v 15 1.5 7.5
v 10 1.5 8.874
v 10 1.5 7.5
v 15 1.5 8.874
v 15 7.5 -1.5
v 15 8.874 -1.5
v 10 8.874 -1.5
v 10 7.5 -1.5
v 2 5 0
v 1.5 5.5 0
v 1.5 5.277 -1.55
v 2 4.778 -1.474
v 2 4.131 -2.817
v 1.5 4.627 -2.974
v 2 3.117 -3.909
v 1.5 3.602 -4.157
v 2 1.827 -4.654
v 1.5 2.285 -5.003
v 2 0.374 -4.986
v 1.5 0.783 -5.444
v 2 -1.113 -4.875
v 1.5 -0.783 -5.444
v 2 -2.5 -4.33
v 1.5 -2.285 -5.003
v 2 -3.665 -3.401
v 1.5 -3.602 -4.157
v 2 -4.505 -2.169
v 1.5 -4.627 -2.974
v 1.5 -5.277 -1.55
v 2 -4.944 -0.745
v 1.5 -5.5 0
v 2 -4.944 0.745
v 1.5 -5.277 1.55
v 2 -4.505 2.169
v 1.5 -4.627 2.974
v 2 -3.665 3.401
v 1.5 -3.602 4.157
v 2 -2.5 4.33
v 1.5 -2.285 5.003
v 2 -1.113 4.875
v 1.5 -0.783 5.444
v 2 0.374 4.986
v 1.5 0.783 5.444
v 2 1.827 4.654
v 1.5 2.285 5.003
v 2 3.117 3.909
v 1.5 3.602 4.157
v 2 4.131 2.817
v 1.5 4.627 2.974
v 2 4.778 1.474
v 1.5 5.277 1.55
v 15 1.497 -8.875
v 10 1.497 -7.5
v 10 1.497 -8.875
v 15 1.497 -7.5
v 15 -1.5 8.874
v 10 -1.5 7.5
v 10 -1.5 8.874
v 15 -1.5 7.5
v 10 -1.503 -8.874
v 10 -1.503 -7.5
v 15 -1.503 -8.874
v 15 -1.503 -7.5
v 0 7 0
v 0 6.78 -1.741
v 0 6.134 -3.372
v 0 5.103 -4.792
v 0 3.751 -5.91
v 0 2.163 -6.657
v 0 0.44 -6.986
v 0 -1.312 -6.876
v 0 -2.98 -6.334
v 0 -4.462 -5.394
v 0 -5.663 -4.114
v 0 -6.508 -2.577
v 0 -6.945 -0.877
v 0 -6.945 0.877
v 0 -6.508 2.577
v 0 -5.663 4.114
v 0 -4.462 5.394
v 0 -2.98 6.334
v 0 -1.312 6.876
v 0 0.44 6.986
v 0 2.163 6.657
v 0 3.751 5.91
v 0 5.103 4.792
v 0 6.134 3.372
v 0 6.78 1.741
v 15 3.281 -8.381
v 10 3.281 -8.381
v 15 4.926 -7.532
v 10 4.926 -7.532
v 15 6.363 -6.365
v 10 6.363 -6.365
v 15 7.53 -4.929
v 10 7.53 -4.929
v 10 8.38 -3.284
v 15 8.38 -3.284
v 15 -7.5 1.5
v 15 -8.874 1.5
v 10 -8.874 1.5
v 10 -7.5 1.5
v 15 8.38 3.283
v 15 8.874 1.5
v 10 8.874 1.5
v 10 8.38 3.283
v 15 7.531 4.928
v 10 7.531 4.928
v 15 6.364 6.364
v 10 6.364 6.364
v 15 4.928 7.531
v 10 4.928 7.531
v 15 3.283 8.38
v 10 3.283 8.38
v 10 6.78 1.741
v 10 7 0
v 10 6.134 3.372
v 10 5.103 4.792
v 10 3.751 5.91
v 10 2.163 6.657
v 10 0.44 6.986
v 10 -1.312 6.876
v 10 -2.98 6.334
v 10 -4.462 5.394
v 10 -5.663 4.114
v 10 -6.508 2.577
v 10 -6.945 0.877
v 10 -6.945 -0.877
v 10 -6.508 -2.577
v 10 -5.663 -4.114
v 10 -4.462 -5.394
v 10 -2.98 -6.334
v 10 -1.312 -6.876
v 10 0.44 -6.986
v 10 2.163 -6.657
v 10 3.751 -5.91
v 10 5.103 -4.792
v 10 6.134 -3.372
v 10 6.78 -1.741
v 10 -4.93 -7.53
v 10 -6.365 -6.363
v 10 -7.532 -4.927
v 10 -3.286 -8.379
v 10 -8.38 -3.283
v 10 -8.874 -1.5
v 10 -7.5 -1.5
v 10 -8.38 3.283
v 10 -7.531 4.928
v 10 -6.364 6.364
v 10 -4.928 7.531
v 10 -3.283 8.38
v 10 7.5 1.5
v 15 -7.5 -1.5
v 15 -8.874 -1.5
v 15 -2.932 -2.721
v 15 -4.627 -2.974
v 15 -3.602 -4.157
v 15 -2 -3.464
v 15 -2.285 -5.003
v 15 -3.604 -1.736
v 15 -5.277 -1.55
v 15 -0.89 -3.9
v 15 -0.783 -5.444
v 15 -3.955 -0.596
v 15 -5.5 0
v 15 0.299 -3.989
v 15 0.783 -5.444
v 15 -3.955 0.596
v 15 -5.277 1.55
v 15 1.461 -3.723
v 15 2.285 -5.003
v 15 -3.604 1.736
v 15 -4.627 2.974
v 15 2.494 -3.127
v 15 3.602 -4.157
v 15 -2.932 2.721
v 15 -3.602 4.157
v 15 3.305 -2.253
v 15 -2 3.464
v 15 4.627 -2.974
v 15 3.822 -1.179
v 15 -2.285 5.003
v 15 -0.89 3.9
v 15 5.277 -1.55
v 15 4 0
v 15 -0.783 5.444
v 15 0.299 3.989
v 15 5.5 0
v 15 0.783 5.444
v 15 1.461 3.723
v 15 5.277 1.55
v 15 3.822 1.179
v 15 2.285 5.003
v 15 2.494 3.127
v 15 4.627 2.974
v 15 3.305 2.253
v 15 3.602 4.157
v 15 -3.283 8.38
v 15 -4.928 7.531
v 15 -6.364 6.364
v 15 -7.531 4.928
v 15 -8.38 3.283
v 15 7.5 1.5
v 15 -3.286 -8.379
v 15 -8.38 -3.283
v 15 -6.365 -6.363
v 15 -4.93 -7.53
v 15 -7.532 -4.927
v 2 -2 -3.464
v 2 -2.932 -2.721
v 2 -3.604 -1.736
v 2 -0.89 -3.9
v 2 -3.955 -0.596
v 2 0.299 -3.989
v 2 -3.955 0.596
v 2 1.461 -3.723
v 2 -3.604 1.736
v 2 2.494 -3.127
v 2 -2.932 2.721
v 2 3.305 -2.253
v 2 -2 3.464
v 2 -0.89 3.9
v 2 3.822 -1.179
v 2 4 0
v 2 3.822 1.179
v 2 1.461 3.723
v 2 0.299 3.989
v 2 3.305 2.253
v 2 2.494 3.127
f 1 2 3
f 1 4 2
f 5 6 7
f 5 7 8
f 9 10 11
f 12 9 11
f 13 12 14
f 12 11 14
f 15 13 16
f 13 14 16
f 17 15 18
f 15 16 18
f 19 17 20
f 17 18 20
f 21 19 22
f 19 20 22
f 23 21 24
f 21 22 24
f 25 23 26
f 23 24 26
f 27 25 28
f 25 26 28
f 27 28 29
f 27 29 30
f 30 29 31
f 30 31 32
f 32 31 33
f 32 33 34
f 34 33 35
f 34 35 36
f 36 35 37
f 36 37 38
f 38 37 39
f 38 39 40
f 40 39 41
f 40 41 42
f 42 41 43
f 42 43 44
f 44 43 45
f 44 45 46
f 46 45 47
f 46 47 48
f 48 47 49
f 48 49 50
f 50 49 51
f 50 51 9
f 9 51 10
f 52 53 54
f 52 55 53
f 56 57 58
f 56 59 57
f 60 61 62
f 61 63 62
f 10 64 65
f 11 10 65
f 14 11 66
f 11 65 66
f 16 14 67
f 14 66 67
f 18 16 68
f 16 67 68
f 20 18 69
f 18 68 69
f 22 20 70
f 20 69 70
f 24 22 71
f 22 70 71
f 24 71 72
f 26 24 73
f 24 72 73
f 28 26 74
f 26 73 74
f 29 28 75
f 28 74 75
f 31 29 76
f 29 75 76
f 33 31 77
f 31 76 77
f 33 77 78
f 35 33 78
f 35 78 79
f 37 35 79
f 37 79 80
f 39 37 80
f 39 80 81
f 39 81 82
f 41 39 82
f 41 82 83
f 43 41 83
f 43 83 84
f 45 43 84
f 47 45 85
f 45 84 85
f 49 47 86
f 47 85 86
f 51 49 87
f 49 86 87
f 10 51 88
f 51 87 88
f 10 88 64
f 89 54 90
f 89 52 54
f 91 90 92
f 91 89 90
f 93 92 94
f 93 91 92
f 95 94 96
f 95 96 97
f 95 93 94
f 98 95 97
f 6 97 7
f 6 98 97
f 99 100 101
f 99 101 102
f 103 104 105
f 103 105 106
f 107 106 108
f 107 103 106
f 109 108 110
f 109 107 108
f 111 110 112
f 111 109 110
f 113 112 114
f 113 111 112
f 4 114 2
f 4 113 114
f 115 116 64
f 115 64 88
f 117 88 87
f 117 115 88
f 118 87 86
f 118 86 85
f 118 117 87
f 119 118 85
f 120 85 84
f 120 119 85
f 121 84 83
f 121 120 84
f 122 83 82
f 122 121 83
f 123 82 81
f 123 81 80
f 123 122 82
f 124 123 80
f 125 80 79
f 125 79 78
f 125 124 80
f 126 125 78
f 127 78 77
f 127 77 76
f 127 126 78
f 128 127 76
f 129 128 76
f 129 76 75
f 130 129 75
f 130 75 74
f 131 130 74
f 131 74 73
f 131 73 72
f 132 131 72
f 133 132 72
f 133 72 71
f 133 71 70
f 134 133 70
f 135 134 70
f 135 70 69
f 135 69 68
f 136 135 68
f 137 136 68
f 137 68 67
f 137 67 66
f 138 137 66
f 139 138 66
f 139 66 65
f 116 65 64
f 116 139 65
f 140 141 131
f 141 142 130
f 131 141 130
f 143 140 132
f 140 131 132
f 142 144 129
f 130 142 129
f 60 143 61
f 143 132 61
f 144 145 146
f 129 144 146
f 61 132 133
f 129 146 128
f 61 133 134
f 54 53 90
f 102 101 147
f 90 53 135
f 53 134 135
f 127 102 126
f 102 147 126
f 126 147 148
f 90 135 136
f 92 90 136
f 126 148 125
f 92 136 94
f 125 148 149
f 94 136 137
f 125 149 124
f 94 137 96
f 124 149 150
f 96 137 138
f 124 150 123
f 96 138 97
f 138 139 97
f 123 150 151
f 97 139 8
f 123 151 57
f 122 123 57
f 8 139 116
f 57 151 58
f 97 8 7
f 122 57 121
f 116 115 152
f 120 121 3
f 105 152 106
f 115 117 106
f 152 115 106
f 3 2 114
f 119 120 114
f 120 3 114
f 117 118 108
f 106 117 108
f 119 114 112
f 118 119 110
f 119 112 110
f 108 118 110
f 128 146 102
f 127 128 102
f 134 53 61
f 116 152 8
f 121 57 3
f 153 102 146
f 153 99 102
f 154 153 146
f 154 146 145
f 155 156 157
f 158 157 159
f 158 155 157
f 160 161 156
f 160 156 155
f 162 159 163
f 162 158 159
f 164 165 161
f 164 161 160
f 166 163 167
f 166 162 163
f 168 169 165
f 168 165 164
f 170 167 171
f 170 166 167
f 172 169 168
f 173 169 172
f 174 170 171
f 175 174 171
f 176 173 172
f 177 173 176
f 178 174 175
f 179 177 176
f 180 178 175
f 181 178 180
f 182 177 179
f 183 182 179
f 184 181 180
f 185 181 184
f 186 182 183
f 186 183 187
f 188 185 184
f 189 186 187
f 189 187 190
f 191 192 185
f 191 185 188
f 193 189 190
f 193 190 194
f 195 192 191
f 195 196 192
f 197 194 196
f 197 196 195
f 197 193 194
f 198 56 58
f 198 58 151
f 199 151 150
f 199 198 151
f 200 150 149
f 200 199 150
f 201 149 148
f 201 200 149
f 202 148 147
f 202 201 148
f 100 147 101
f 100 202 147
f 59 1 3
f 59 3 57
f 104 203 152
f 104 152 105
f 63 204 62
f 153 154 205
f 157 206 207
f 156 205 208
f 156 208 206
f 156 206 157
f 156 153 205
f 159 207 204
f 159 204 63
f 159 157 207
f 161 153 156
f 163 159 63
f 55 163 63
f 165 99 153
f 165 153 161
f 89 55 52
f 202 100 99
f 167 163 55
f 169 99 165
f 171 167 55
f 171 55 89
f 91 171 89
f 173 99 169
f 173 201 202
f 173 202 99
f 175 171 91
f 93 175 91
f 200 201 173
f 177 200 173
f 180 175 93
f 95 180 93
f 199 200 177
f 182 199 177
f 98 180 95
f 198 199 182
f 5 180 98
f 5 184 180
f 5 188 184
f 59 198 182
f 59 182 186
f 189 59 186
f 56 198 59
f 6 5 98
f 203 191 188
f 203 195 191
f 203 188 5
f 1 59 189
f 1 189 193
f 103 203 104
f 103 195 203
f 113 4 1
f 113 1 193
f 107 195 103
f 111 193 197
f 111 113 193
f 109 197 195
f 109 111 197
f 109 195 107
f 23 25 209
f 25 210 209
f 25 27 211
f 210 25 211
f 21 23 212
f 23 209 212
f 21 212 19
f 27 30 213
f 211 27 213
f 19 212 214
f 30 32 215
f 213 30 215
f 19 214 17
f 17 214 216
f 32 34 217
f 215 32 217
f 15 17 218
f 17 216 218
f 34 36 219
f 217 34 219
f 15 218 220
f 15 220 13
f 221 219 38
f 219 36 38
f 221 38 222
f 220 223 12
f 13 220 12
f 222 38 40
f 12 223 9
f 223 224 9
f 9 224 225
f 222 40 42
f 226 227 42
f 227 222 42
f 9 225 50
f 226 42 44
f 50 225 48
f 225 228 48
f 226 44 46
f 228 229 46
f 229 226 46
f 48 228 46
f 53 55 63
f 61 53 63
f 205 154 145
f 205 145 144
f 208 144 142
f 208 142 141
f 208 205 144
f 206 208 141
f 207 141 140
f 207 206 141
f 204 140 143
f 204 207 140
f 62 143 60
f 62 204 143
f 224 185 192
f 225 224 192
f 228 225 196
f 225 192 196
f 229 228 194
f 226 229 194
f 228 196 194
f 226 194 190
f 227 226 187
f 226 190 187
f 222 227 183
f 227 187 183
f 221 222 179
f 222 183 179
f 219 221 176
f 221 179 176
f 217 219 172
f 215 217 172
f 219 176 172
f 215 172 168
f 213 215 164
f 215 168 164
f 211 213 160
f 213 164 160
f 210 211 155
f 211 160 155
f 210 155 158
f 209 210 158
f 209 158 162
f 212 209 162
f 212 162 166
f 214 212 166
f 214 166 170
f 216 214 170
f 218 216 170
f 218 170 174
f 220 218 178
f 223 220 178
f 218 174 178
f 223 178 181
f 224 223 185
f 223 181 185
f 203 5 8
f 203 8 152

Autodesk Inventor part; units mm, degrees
ref_plane "YZ Plane" through (0, 0, 0) normal (1, 0, 0) x (0, 1, 0)
ref_plane "XZ Plane" through (0, 0, 0) normal (0, 1, 0) x (-1, 0, 0)
ref_plane "XY Plane" through (0, 0, 0) normal (0, 0, 1) x (1, 0, 0)
sketch "Sketch1" plane through (0, 0, 0) normal (0, 0, 1) x (1, 0, 0)
  line L0 (0, 0) -> (0, 7) construction
  line L1 (0, 7) -> (10, 7)
  line L2 (0, 7) -> (1.5, 5.5)
  line L3 (10, 7) -> (10, 9)
  line L4 (10, 9) -> (15, 9)
  line L5 (15, 9) -> (15, 5.5)
  line L6 (15, 5.5) -> (1.5, 5.5)
  line L7 (0, 0) -> (19.3515, 0)
  line L8 (2, 4) -> (15, 4)
  line L9 (15, 4) -> (15, 5.5)
  line L10 (1.5, 5.5) -> (1.5, 0) construction
  line L11 (2, 5) -> (2, 4)
  line L12 (2, 5) -> (1.5, 5.5)
  dimension "d0" = 10
  dimension "d1" = 5
  dimension "d2" = 14
  dimension "d3" = 11
  dimension "d4" = 18
  dimension "d8" = 13
  dimension "d9" = 8
  dimension "d10" = 0.5
revolve "Revolution1" add sketch "Sketch1" angle 360 about axis through (0, 0, 0) along (1, 0, 0)
sketch "Sketch2" plane through (15, 0, 0) normal (1, 0, 0) x (0, 0, -1)
  line L0 (-1.5, 9.5651) -> (1.5, 9.5651)
  line L1 (1.5, 9.5651) -> (1.5, 7.5)
  line L2 (1.5, 7.5) -> (-1.5, 7.5)
  line L3 (-1.5, 7.5) -> (-1.5, 9.5651)
  line L4 (8.9736, 1.4966) -> (8.9736, -0.0034)
  line L5 (7.5, -0.0034) -> (7.5, 1.4966)
  line L6 (-1.5, -7.5) -> (1.5, -7.5)
  line L7 (1.5, -7.5) -> (1.5, -9.612)
  line L8 (1.5, -9.612) -> (-1.5, -9.612)
  line L9 (-1.5, -9.612) -> (-1.5, -7.5)
  circle A0 centre (0, 0) radius 7 projected
  circle A1 centre (0, 0) radius 9 projected
  circle A2 centre (0, 0) radius 4 projected
  line L10 (7.2867, -0.0034) -> (9.9612, -0.0034) construction
  line L11 (7.5, 1.4966) -> (9, 1.4966)
  line L12 (7.5, -1.5034) -> (9, -1.5034)
  line L13 (7.5, -0.0034) -> (7.5, -1.5034)
  line L14 (9, 0) -> (9, -1.5034)
  line L15 (-10.5, 1.5) -> (-7.5, 1.5)
  line L16 (-7.5, 1.5) -> (-7.5, -1.5)
  line L17 (-7.5, -1.5) -> (-10.5, -1.5)
  line L18 (-10.5, -1.5) -> (-10.5, 1.5)
  line L19 (-10.5, 1.5) -> (-7.5, -1.5) construction
  line L20 (-7.5, 1.5) -> (-10.5, -1.5) construction
  point P0 (0, 9)
  point P1 (0, -9)
  point P2 (-9, 0)
  point P3 (-1.5, -8.8741)
  point P4 (1.5, -8.8741)
  point P5 (-8.8741, 1.5)
  point P6 (-8.8741, -1.5)
  point P7 (1.5, 8.8741)
  point P8 (-1.5, 8.8741)
  point P9 (8.8736, -1.5034)
  point P10 (8.8747, 1.4966)
  dimension "d11" = 1.5
  dimension "d12" = 1.5
  dimension "d13" = 1.5
  dimension "d16" = 1.5
  dimension "d18" = 1.5
  dimension "d20" = 3
  dimension "d21" = 3
  dimension "d22" = 3
  dimension "d23" = 1.5
  dimension "d24" = 3
  dimension "d25" = 1.5
extrude "Extrusion1" cut sketch "Sketch2" against normal blind 10 contours A1 L1 L2 L3 | L15 L16 L17 A1 | A1 L12 L13 L5 L11 | L9 L6 L7 A1
thread "Thread1" size "M14x2" class "6g" standard "ANSI Metric M Profile" length 24.5
properties material "Aluminum 6061-AHC"
